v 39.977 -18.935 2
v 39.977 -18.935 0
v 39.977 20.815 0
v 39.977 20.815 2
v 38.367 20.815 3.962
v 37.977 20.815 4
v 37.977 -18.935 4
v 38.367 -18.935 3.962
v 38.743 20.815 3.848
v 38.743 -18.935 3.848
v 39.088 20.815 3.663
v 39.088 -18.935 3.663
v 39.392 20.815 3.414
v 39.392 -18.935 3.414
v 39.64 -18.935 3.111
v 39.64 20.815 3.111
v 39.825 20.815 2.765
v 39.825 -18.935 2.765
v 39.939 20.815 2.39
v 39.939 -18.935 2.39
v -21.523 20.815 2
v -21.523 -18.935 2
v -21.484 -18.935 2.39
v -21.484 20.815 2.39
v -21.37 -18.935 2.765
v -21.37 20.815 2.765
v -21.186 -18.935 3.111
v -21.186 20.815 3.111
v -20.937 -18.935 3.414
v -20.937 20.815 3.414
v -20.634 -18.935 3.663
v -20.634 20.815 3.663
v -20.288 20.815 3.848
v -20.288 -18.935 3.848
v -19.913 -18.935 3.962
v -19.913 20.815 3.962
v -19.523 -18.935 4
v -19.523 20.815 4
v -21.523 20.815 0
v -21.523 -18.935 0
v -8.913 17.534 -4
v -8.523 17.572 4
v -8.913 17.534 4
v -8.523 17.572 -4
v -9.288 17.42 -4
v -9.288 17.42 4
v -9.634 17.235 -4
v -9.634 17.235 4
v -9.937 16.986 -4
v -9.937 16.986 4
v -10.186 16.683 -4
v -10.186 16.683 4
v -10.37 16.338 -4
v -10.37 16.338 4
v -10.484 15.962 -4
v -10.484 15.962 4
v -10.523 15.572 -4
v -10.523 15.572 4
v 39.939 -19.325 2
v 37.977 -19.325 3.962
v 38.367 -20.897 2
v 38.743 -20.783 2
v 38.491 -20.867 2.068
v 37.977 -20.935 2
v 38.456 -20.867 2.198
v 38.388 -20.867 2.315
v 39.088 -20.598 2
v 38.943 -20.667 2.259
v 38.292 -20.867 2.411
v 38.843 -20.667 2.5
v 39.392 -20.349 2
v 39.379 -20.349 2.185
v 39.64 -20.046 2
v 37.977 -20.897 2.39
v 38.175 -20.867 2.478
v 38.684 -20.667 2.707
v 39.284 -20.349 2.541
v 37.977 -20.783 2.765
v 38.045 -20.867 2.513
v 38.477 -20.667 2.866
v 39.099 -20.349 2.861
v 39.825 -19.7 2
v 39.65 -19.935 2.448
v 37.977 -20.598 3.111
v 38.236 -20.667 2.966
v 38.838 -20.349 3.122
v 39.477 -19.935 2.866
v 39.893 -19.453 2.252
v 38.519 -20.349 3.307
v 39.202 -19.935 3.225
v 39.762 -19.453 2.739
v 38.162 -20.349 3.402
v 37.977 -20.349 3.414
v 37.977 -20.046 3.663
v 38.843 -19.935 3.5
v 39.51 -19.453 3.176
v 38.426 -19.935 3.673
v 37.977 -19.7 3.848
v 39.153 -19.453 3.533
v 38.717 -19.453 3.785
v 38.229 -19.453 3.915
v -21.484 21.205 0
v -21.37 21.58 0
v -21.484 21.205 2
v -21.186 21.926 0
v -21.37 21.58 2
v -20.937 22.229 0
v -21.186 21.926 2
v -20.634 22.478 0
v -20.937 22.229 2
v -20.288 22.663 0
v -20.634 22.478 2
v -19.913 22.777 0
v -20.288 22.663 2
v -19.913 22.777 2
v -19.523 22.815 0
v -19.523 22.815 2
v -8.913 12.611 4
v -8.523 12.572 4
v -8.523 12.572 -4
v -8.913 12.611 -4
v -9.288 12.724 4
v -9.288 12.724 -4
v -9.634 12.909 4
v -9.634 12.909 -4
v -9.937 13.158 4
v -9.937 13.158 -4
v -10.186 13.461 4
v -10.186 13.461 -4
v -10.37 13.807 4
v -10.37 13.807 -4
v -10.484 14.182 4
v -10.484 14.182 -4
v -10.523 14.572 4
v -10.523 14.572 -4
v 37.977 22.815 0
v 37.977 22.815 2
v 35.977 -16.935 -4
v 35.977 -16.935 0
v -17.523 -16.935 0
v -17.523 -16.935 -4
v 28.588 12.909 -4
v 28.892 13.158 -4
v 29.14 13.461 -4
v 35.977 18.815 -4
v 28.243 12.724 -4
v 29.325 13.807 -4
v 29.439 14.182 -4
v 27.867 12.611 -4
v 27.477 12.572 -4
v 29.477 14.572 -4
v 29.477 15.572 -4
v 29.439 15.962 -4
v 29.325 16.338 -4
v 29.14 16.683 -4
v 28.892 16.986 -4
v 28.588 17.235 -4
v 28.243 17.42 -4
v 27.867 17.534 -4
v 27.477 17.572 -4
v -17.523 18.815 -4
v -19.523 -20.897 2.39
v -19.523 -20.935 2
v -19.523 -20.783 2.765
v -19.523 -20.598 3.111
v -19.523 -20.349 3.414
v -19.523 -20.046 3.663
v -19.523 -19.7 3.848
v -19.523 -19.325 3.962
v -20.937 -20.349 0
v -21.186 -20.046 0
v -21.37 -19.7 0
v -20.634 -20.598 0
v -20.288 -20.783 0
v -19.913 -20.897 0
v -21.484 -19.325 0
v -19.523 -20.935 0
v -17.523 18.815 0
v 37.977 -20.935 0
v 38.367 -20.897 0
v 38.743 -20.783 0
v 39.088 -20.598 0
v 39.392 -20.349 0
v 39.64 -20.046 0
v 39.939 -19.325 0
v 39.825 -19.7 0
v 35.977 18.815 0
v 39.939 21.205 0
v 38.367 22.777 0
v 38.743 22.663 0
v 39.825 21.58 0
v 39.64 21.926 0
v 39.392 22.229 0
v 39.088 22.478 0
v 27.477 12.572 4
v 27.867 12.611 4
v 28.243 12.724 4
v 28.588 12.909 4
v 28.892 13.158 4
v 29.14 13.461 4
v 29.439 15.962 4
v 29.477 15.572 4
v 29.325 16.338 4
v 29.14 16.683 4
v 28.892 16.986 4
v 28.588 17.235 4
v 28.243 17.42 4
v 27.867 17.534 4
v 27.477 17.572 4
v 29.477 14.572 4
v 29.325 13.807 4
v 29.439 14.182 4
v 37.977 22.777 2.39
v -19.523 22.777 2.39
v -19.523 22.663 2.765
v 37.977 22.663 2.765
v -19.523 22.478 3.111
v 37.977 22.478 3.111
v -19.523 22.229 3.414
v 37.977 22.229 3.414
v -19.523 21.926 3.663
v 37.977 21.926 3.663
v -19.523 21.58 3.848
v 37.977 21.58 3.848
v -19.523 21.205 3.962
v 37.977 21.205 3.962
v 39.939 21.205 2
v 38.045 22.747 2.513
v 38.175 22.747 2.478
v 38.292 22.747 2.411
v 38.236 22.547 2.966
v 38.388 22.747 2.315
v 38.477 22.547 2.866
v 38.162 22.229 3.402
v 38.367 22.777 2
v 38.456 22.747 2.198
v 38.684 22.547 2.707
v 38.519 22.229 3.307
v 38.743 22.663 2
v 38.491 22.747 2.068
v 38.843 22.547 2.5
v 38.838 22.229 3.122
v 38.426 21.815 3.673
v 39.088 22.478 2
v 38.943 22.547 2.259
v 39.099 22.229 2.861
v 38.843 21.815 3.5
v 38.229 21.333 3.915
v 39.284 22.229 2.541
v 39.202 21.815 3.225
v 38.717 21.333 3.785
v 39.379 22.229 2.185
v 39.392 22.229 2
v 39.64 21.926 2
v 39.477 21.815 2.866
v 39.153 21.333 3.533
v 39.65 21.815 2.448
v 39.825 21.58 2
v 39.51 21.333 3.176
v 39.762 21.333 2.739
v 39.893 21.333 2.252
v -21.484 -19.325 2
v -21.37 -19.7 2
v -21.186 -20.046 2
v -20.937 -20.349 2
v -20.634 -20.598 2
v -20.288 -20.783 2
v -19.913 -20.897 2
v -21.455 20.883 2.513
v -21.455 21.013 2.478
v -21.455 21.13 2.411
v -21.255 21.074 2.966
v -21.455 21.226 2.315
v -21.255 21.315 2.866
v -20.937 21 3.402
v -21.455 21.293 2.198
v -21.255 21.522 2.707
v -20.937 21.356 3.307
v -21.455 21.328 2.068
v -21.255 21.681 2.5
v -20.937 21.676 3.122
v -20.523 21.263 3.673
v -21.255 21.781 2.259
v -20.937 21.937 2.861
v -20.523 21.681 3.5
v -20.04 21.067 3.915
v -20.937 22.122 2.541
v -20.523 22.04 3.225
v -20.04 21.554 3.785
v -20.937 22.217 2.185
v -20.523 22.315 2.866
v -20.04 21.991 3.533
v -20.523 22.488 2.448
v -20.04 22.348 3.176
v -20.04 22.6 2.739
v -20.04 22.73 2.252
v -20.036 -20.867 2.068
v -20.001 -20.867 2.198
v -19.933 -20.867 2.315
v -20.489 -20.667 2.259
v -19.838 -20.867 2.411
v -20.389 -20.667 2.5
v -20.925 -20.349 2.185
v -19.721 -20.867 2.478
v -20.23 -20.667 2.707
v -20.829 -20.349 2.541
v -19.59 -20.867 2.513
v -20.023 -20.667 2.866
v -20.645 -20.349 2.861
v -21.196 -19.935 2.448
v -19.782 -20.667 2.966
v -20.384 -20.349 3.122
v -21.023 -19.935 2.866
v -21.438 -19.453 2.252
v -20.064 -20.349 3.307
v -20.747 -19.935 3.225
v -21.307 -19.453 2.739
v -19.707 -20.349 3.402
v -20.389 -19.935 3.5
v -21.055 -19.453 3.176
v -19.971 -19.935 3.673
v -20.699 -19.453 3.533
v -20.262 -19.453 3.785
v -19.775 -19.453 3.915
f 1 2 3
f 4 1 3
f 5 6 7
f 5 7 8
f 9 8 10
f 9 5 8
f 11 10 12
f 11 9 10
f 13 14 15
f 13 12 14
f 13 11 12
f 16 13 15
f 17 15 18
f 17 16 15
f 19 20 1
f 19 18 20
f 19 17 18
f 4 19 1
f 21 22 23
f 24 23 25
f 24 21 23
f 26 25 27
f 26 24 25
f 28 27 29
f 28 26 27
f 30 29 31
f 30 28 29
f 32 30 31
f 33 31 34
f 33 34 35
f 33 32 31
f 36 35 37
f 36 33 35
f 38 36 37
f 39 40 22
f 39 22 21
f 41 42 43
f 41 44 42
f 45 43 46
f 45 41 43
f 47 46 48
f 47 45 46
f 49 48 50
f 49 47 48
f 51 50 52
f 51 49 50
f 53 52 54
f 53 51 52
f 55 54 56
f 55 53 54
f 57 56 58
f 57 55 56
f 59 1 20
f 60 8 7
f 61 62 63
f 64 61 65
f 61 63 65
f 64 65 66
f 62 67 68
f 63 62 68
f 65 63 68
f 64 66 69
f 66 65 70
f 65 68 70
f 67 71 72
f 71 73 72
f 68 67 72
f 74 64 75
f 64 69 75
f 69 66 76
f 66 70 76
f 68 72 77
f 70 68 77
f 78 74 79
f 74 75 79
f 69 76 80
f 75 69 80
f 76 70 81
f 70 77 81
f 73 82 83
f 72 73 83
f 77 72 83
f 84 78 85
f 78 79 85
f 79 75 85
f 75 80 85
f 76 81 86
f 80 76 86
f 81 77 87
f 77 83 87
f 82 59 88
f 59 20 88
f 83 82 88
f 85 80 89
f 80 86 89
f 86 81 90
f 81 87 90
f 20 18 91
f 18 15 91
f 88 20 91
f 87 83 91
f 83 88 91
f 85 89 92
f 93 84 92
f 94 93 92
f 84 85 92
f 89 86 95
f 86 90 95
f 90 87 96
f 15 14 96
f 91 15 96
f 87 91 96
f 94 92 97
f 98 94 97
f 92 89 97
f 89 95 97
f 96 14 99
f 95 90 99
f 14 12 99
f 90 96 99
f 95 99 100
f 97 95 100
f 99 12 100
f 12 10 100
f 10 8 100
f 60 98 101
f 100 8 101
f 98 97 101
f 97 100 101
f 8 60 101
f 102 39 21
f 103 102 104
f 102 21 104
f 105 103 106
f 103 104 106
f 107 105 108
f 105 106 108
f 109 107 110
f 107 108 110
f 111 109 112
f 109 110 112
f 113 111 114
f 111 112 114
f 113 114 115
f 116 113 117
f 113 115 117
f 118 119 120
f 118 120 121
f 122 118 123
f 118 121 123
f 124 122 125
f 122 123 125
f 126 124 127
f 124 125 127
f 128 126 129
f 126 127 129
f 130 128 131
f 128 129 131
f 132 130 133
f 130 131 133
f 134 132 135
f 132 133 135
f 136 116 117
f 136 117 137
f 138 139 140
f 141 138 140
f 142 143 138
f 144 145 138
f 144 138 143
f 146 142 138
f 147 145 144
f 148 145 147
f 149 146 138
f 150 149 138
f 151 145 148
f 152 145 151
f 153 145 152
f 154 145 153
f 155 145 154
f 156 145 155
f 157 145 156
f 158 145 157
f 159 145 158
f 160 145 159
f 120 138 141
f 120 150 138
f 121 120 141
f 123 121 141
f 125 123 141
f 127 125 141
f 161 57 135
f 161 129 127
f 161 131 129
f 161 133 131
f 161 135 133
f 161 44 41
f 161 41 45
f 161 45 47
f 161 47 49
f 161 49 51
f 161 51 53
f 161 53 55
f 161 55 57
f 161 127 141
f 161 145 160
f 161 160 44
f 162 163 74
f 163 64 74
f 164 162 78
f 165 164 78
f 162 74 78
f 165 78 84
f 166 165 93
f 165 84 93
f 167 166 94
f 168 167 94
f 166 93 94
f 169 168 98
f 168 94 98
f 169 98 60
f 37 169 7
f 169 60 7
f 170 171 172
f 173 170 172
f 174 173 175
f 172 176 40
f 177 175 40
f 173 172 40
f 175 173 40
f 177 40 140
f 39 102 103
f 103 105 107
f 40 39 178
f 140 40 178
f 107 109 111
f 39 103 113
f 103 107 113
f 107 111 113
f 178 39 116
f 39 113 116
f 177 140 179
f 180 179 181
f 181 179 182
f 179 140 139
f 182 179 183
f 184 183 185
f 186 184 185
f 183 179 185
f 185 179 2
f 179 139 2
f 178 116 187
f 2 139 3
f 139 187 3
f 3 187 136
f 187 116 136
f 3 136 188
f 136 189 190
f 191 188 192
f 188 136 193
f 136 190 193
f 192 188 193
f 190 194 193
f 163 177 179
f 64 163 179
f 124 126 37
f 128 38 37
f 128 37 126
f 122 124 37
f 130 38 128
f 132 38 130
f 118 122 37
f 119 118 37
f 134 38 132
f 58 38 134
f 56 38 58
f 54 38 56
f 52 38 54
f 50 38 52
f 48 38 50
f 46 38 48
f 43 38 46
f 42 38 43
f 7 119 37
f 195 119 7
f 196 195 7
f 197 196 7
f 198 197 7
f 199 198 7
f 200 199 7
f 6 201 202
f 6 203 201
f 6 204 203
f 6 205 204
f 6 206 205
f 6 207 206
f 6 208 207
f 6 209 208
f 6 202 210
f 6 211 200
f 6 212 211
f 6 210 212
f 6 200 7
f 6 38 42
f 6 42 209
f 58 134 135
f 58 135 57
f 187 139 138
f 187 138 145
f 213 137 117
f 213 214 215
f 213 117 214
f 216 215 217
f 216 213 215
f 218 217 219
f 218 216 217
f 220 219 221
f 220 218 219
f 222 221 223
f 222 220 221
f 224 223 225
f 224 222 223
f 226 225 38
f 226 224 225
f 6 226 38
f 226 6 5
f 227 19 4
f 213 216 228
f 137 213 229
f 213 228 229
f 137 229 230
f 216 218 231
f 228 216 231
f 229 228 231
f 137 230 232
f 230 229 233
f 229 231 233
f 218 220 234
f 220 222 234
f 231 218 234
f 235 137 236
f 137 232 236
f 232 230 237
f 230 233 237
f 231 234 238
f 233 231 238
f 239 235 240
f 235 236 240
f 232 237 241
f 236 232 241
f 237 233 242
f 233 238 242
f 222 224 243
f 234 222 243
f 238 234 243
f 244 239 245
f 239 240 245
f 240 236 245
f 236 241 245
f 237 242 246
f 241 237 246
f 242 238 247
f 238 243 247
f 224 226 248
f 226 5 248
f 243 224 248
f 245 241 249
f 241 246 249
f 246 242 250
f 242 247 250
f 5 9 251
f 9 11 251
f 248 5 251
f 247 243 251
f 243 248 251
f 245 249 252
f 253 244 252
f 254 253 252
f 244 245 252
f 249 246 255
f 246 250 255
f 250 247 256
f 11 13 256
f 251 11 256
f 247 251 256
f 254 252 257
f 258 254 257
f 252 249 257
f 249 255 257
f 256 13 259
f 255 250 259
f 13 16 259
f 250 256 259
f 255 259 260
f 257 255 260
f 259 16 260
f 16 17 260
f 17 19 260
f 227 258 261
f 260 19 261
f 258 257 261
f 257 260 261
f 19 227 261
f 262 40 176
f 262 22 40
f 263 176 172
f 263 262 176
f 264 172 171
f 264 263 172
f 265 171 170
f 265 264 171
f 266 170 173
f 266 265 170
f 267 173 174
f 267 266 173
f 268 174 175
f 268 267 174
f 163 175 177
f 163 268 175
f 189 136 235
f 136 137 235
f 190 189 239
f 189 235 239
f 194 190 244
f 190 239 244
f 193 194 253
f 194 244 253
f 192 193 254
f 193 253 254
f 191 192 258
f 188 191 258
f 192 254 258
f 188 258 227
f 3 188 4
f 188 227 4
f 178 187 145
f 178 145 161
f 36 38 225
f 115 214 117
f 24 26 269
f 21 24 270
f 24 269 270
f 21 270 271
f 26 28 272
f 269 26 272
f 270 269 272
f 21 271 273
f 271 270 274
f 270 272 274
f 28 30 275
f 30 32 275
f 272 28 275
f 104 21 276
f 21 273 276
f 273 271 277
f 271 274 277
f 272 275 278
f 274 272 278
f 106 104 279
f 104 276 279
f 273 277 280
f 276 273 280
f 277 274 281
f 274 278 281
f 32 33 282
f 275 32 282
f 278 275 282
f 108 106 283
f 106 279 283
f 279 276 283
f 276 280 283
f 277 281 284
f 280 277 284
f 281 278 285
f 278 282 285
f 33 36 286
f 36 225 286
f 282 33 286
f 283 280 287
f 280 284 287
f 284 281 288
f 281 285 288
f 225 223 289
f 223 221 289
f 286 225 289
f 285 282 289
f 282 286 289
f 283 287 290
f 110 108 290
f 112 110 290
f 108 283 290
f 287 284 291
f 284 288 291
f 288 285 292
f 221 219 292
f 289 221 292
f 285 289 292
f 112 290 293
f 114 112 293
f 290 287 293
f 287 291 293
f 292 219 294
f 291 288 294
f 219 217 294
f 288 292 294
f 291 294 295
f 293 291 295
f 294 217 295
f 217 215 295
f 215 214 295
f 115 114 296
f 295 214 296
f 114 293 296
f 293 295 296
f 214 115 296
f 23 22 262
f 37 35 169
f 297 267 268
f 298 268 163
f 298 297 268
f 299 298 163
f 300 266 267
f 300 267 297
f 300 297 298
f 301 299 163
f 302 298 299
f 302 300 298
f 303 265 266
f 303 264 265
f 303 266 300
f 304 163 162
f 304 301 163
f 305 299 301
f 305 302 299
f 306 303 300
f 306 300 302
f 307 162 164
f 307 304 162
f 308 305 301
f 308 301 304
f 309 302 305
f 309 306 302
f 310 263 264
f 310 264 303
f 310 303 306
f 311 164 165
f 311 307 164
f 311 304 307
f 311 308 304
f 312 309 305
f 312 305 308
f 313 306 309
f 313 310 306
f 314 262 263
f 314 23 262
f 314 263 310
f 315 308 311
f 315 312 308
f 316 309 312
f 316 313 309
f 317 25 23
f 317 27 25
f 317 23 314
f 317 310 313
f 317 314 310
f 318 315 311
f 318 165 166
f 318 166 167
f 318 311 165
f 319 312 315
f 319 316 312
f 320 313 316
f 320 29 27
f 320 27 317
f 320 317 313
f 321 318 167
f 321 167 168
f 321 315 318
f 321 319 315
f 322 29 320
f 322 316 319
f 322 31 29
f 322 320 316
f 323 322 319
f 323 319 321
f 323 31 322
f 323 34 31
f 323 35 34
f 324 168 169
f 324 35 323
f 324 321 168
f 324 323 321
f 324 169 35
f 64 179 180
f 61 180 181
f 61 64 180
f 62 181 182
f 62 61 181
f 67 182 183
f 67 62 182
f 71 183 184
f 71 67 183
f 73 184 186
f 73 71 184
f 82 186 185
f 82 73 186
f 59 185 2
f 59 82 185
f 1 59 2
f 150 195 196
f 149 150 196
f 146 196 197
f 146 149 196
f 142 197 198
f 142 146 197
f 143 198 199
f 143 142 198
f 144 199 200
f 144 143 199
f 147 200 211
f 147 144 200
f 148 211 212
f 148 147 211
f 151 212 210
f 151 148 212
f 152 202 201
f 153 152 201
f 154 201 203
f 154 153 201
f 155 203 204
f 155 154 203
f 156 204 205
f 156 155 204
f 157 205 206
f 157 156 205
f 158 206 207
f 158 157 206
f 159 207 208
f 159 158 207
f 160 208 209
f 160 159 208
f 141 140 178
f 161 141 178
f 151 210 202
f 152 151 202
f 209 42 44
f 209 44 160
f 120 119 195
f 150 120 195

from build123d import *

# Parameters (mm, degrees)
ESQUISSE1_W             = 61.5
ESQUISSE1_H             = 43.75
BOSS_EXTRU_1_DEPTH      = 4
ESQUISSE2_W             = 53.5
ESQUISSE2_H             = 35.75
BOSS_EXTRU_2_DEPTH      = 4
CONG_1_R                = 2
ENL_V_MAT_EXTRU_1_REACH = 10
ESQUISSE3_W             = 40
ESQUISSE3_H             = 5
CONG_2_R                = 2


with BuildPart() as part:
    # Esquisse1 → Boss.-Extru.1 (new body)
    with BuildSketch(Plane.XY):
        with Locations((9.227308767, 0.94004118)):
            Rectangle(ESQUISSE1_W, ESQUISSE1_H)
    extrude(amount=BOSS_EXTRU_1_DEPTH)

    # Esquisse2 → Boss.-Extru.2 (add)
    with BuildSketch(Plane(origin=(0, 0, 0), x_dir=(-1, 0, 0), z_dir=(0, 0, -1))):
        with Locations((-9.227308767, 0.94004118)):
            Rectangle(ESQUISSE2_W, ESQUISSE2_H)
    extrude(amount=BOSS_EXTRU_2_DEPTH)

    # Congé1
    cong_1_edges = [part.edges().sort_by_distance(p)[0] for p in [
        (39.977308767, 0.94004118, 4),
        (9.227308767, 22.81504118, 4),
        (-21.522691233, 0.94004118, 4),
        (-21.522691233, 22.81504118, 2),
        (39.977308767, 22.81504118, 2),
        (39.977308767, -20.93495882, 2),
        (-21.522691233, -20.93495882, 2),
        (9.227308767, -20.93495882, 4),
    ]]
    fillet(cong_1_edges, radius=CONG_1_R)

    # Esquisse3 → Enlèv. mat.-Extru.1 (cut, up to next)
    with BuildSketch(Plane.XY.offset(4), mode=Mode.PRIVATE) as enl_v_mat_extru_1_sk1:
        with Locations((9.477308767, 15.072235538)):
            Rectangle(ESQUISSE3_W, ESQUISSE3_H)
    enl_v_mat_extru_1_tool1 = extrude(enl_v_mat_extru_1_sk1.sketch, amount=-ENL_V_MAT_EXTRU_1_REACH, mode=Mode.PRIVATE) & part.part
    add(enl_v_mat_extru_1_tool1.solids().sort_by_distance((9.477309, 15.072236, 4))[0], mode=Mode.SUBTRACT)

    # Congé2
    cong_2_edges = [part.edges().sort_by_distance(p)[0] for p in [
        (-10.522691233, 12.572235538, 0),
        (-10.522691233, 17.572235538, 0),
        (29.477308767, 17.572235538, 0),
        (29.477308767, 12.572235538, 0),
    ]]
    fillet(cong_2_edges, radius=CONG_2_R)


solid = part.part
